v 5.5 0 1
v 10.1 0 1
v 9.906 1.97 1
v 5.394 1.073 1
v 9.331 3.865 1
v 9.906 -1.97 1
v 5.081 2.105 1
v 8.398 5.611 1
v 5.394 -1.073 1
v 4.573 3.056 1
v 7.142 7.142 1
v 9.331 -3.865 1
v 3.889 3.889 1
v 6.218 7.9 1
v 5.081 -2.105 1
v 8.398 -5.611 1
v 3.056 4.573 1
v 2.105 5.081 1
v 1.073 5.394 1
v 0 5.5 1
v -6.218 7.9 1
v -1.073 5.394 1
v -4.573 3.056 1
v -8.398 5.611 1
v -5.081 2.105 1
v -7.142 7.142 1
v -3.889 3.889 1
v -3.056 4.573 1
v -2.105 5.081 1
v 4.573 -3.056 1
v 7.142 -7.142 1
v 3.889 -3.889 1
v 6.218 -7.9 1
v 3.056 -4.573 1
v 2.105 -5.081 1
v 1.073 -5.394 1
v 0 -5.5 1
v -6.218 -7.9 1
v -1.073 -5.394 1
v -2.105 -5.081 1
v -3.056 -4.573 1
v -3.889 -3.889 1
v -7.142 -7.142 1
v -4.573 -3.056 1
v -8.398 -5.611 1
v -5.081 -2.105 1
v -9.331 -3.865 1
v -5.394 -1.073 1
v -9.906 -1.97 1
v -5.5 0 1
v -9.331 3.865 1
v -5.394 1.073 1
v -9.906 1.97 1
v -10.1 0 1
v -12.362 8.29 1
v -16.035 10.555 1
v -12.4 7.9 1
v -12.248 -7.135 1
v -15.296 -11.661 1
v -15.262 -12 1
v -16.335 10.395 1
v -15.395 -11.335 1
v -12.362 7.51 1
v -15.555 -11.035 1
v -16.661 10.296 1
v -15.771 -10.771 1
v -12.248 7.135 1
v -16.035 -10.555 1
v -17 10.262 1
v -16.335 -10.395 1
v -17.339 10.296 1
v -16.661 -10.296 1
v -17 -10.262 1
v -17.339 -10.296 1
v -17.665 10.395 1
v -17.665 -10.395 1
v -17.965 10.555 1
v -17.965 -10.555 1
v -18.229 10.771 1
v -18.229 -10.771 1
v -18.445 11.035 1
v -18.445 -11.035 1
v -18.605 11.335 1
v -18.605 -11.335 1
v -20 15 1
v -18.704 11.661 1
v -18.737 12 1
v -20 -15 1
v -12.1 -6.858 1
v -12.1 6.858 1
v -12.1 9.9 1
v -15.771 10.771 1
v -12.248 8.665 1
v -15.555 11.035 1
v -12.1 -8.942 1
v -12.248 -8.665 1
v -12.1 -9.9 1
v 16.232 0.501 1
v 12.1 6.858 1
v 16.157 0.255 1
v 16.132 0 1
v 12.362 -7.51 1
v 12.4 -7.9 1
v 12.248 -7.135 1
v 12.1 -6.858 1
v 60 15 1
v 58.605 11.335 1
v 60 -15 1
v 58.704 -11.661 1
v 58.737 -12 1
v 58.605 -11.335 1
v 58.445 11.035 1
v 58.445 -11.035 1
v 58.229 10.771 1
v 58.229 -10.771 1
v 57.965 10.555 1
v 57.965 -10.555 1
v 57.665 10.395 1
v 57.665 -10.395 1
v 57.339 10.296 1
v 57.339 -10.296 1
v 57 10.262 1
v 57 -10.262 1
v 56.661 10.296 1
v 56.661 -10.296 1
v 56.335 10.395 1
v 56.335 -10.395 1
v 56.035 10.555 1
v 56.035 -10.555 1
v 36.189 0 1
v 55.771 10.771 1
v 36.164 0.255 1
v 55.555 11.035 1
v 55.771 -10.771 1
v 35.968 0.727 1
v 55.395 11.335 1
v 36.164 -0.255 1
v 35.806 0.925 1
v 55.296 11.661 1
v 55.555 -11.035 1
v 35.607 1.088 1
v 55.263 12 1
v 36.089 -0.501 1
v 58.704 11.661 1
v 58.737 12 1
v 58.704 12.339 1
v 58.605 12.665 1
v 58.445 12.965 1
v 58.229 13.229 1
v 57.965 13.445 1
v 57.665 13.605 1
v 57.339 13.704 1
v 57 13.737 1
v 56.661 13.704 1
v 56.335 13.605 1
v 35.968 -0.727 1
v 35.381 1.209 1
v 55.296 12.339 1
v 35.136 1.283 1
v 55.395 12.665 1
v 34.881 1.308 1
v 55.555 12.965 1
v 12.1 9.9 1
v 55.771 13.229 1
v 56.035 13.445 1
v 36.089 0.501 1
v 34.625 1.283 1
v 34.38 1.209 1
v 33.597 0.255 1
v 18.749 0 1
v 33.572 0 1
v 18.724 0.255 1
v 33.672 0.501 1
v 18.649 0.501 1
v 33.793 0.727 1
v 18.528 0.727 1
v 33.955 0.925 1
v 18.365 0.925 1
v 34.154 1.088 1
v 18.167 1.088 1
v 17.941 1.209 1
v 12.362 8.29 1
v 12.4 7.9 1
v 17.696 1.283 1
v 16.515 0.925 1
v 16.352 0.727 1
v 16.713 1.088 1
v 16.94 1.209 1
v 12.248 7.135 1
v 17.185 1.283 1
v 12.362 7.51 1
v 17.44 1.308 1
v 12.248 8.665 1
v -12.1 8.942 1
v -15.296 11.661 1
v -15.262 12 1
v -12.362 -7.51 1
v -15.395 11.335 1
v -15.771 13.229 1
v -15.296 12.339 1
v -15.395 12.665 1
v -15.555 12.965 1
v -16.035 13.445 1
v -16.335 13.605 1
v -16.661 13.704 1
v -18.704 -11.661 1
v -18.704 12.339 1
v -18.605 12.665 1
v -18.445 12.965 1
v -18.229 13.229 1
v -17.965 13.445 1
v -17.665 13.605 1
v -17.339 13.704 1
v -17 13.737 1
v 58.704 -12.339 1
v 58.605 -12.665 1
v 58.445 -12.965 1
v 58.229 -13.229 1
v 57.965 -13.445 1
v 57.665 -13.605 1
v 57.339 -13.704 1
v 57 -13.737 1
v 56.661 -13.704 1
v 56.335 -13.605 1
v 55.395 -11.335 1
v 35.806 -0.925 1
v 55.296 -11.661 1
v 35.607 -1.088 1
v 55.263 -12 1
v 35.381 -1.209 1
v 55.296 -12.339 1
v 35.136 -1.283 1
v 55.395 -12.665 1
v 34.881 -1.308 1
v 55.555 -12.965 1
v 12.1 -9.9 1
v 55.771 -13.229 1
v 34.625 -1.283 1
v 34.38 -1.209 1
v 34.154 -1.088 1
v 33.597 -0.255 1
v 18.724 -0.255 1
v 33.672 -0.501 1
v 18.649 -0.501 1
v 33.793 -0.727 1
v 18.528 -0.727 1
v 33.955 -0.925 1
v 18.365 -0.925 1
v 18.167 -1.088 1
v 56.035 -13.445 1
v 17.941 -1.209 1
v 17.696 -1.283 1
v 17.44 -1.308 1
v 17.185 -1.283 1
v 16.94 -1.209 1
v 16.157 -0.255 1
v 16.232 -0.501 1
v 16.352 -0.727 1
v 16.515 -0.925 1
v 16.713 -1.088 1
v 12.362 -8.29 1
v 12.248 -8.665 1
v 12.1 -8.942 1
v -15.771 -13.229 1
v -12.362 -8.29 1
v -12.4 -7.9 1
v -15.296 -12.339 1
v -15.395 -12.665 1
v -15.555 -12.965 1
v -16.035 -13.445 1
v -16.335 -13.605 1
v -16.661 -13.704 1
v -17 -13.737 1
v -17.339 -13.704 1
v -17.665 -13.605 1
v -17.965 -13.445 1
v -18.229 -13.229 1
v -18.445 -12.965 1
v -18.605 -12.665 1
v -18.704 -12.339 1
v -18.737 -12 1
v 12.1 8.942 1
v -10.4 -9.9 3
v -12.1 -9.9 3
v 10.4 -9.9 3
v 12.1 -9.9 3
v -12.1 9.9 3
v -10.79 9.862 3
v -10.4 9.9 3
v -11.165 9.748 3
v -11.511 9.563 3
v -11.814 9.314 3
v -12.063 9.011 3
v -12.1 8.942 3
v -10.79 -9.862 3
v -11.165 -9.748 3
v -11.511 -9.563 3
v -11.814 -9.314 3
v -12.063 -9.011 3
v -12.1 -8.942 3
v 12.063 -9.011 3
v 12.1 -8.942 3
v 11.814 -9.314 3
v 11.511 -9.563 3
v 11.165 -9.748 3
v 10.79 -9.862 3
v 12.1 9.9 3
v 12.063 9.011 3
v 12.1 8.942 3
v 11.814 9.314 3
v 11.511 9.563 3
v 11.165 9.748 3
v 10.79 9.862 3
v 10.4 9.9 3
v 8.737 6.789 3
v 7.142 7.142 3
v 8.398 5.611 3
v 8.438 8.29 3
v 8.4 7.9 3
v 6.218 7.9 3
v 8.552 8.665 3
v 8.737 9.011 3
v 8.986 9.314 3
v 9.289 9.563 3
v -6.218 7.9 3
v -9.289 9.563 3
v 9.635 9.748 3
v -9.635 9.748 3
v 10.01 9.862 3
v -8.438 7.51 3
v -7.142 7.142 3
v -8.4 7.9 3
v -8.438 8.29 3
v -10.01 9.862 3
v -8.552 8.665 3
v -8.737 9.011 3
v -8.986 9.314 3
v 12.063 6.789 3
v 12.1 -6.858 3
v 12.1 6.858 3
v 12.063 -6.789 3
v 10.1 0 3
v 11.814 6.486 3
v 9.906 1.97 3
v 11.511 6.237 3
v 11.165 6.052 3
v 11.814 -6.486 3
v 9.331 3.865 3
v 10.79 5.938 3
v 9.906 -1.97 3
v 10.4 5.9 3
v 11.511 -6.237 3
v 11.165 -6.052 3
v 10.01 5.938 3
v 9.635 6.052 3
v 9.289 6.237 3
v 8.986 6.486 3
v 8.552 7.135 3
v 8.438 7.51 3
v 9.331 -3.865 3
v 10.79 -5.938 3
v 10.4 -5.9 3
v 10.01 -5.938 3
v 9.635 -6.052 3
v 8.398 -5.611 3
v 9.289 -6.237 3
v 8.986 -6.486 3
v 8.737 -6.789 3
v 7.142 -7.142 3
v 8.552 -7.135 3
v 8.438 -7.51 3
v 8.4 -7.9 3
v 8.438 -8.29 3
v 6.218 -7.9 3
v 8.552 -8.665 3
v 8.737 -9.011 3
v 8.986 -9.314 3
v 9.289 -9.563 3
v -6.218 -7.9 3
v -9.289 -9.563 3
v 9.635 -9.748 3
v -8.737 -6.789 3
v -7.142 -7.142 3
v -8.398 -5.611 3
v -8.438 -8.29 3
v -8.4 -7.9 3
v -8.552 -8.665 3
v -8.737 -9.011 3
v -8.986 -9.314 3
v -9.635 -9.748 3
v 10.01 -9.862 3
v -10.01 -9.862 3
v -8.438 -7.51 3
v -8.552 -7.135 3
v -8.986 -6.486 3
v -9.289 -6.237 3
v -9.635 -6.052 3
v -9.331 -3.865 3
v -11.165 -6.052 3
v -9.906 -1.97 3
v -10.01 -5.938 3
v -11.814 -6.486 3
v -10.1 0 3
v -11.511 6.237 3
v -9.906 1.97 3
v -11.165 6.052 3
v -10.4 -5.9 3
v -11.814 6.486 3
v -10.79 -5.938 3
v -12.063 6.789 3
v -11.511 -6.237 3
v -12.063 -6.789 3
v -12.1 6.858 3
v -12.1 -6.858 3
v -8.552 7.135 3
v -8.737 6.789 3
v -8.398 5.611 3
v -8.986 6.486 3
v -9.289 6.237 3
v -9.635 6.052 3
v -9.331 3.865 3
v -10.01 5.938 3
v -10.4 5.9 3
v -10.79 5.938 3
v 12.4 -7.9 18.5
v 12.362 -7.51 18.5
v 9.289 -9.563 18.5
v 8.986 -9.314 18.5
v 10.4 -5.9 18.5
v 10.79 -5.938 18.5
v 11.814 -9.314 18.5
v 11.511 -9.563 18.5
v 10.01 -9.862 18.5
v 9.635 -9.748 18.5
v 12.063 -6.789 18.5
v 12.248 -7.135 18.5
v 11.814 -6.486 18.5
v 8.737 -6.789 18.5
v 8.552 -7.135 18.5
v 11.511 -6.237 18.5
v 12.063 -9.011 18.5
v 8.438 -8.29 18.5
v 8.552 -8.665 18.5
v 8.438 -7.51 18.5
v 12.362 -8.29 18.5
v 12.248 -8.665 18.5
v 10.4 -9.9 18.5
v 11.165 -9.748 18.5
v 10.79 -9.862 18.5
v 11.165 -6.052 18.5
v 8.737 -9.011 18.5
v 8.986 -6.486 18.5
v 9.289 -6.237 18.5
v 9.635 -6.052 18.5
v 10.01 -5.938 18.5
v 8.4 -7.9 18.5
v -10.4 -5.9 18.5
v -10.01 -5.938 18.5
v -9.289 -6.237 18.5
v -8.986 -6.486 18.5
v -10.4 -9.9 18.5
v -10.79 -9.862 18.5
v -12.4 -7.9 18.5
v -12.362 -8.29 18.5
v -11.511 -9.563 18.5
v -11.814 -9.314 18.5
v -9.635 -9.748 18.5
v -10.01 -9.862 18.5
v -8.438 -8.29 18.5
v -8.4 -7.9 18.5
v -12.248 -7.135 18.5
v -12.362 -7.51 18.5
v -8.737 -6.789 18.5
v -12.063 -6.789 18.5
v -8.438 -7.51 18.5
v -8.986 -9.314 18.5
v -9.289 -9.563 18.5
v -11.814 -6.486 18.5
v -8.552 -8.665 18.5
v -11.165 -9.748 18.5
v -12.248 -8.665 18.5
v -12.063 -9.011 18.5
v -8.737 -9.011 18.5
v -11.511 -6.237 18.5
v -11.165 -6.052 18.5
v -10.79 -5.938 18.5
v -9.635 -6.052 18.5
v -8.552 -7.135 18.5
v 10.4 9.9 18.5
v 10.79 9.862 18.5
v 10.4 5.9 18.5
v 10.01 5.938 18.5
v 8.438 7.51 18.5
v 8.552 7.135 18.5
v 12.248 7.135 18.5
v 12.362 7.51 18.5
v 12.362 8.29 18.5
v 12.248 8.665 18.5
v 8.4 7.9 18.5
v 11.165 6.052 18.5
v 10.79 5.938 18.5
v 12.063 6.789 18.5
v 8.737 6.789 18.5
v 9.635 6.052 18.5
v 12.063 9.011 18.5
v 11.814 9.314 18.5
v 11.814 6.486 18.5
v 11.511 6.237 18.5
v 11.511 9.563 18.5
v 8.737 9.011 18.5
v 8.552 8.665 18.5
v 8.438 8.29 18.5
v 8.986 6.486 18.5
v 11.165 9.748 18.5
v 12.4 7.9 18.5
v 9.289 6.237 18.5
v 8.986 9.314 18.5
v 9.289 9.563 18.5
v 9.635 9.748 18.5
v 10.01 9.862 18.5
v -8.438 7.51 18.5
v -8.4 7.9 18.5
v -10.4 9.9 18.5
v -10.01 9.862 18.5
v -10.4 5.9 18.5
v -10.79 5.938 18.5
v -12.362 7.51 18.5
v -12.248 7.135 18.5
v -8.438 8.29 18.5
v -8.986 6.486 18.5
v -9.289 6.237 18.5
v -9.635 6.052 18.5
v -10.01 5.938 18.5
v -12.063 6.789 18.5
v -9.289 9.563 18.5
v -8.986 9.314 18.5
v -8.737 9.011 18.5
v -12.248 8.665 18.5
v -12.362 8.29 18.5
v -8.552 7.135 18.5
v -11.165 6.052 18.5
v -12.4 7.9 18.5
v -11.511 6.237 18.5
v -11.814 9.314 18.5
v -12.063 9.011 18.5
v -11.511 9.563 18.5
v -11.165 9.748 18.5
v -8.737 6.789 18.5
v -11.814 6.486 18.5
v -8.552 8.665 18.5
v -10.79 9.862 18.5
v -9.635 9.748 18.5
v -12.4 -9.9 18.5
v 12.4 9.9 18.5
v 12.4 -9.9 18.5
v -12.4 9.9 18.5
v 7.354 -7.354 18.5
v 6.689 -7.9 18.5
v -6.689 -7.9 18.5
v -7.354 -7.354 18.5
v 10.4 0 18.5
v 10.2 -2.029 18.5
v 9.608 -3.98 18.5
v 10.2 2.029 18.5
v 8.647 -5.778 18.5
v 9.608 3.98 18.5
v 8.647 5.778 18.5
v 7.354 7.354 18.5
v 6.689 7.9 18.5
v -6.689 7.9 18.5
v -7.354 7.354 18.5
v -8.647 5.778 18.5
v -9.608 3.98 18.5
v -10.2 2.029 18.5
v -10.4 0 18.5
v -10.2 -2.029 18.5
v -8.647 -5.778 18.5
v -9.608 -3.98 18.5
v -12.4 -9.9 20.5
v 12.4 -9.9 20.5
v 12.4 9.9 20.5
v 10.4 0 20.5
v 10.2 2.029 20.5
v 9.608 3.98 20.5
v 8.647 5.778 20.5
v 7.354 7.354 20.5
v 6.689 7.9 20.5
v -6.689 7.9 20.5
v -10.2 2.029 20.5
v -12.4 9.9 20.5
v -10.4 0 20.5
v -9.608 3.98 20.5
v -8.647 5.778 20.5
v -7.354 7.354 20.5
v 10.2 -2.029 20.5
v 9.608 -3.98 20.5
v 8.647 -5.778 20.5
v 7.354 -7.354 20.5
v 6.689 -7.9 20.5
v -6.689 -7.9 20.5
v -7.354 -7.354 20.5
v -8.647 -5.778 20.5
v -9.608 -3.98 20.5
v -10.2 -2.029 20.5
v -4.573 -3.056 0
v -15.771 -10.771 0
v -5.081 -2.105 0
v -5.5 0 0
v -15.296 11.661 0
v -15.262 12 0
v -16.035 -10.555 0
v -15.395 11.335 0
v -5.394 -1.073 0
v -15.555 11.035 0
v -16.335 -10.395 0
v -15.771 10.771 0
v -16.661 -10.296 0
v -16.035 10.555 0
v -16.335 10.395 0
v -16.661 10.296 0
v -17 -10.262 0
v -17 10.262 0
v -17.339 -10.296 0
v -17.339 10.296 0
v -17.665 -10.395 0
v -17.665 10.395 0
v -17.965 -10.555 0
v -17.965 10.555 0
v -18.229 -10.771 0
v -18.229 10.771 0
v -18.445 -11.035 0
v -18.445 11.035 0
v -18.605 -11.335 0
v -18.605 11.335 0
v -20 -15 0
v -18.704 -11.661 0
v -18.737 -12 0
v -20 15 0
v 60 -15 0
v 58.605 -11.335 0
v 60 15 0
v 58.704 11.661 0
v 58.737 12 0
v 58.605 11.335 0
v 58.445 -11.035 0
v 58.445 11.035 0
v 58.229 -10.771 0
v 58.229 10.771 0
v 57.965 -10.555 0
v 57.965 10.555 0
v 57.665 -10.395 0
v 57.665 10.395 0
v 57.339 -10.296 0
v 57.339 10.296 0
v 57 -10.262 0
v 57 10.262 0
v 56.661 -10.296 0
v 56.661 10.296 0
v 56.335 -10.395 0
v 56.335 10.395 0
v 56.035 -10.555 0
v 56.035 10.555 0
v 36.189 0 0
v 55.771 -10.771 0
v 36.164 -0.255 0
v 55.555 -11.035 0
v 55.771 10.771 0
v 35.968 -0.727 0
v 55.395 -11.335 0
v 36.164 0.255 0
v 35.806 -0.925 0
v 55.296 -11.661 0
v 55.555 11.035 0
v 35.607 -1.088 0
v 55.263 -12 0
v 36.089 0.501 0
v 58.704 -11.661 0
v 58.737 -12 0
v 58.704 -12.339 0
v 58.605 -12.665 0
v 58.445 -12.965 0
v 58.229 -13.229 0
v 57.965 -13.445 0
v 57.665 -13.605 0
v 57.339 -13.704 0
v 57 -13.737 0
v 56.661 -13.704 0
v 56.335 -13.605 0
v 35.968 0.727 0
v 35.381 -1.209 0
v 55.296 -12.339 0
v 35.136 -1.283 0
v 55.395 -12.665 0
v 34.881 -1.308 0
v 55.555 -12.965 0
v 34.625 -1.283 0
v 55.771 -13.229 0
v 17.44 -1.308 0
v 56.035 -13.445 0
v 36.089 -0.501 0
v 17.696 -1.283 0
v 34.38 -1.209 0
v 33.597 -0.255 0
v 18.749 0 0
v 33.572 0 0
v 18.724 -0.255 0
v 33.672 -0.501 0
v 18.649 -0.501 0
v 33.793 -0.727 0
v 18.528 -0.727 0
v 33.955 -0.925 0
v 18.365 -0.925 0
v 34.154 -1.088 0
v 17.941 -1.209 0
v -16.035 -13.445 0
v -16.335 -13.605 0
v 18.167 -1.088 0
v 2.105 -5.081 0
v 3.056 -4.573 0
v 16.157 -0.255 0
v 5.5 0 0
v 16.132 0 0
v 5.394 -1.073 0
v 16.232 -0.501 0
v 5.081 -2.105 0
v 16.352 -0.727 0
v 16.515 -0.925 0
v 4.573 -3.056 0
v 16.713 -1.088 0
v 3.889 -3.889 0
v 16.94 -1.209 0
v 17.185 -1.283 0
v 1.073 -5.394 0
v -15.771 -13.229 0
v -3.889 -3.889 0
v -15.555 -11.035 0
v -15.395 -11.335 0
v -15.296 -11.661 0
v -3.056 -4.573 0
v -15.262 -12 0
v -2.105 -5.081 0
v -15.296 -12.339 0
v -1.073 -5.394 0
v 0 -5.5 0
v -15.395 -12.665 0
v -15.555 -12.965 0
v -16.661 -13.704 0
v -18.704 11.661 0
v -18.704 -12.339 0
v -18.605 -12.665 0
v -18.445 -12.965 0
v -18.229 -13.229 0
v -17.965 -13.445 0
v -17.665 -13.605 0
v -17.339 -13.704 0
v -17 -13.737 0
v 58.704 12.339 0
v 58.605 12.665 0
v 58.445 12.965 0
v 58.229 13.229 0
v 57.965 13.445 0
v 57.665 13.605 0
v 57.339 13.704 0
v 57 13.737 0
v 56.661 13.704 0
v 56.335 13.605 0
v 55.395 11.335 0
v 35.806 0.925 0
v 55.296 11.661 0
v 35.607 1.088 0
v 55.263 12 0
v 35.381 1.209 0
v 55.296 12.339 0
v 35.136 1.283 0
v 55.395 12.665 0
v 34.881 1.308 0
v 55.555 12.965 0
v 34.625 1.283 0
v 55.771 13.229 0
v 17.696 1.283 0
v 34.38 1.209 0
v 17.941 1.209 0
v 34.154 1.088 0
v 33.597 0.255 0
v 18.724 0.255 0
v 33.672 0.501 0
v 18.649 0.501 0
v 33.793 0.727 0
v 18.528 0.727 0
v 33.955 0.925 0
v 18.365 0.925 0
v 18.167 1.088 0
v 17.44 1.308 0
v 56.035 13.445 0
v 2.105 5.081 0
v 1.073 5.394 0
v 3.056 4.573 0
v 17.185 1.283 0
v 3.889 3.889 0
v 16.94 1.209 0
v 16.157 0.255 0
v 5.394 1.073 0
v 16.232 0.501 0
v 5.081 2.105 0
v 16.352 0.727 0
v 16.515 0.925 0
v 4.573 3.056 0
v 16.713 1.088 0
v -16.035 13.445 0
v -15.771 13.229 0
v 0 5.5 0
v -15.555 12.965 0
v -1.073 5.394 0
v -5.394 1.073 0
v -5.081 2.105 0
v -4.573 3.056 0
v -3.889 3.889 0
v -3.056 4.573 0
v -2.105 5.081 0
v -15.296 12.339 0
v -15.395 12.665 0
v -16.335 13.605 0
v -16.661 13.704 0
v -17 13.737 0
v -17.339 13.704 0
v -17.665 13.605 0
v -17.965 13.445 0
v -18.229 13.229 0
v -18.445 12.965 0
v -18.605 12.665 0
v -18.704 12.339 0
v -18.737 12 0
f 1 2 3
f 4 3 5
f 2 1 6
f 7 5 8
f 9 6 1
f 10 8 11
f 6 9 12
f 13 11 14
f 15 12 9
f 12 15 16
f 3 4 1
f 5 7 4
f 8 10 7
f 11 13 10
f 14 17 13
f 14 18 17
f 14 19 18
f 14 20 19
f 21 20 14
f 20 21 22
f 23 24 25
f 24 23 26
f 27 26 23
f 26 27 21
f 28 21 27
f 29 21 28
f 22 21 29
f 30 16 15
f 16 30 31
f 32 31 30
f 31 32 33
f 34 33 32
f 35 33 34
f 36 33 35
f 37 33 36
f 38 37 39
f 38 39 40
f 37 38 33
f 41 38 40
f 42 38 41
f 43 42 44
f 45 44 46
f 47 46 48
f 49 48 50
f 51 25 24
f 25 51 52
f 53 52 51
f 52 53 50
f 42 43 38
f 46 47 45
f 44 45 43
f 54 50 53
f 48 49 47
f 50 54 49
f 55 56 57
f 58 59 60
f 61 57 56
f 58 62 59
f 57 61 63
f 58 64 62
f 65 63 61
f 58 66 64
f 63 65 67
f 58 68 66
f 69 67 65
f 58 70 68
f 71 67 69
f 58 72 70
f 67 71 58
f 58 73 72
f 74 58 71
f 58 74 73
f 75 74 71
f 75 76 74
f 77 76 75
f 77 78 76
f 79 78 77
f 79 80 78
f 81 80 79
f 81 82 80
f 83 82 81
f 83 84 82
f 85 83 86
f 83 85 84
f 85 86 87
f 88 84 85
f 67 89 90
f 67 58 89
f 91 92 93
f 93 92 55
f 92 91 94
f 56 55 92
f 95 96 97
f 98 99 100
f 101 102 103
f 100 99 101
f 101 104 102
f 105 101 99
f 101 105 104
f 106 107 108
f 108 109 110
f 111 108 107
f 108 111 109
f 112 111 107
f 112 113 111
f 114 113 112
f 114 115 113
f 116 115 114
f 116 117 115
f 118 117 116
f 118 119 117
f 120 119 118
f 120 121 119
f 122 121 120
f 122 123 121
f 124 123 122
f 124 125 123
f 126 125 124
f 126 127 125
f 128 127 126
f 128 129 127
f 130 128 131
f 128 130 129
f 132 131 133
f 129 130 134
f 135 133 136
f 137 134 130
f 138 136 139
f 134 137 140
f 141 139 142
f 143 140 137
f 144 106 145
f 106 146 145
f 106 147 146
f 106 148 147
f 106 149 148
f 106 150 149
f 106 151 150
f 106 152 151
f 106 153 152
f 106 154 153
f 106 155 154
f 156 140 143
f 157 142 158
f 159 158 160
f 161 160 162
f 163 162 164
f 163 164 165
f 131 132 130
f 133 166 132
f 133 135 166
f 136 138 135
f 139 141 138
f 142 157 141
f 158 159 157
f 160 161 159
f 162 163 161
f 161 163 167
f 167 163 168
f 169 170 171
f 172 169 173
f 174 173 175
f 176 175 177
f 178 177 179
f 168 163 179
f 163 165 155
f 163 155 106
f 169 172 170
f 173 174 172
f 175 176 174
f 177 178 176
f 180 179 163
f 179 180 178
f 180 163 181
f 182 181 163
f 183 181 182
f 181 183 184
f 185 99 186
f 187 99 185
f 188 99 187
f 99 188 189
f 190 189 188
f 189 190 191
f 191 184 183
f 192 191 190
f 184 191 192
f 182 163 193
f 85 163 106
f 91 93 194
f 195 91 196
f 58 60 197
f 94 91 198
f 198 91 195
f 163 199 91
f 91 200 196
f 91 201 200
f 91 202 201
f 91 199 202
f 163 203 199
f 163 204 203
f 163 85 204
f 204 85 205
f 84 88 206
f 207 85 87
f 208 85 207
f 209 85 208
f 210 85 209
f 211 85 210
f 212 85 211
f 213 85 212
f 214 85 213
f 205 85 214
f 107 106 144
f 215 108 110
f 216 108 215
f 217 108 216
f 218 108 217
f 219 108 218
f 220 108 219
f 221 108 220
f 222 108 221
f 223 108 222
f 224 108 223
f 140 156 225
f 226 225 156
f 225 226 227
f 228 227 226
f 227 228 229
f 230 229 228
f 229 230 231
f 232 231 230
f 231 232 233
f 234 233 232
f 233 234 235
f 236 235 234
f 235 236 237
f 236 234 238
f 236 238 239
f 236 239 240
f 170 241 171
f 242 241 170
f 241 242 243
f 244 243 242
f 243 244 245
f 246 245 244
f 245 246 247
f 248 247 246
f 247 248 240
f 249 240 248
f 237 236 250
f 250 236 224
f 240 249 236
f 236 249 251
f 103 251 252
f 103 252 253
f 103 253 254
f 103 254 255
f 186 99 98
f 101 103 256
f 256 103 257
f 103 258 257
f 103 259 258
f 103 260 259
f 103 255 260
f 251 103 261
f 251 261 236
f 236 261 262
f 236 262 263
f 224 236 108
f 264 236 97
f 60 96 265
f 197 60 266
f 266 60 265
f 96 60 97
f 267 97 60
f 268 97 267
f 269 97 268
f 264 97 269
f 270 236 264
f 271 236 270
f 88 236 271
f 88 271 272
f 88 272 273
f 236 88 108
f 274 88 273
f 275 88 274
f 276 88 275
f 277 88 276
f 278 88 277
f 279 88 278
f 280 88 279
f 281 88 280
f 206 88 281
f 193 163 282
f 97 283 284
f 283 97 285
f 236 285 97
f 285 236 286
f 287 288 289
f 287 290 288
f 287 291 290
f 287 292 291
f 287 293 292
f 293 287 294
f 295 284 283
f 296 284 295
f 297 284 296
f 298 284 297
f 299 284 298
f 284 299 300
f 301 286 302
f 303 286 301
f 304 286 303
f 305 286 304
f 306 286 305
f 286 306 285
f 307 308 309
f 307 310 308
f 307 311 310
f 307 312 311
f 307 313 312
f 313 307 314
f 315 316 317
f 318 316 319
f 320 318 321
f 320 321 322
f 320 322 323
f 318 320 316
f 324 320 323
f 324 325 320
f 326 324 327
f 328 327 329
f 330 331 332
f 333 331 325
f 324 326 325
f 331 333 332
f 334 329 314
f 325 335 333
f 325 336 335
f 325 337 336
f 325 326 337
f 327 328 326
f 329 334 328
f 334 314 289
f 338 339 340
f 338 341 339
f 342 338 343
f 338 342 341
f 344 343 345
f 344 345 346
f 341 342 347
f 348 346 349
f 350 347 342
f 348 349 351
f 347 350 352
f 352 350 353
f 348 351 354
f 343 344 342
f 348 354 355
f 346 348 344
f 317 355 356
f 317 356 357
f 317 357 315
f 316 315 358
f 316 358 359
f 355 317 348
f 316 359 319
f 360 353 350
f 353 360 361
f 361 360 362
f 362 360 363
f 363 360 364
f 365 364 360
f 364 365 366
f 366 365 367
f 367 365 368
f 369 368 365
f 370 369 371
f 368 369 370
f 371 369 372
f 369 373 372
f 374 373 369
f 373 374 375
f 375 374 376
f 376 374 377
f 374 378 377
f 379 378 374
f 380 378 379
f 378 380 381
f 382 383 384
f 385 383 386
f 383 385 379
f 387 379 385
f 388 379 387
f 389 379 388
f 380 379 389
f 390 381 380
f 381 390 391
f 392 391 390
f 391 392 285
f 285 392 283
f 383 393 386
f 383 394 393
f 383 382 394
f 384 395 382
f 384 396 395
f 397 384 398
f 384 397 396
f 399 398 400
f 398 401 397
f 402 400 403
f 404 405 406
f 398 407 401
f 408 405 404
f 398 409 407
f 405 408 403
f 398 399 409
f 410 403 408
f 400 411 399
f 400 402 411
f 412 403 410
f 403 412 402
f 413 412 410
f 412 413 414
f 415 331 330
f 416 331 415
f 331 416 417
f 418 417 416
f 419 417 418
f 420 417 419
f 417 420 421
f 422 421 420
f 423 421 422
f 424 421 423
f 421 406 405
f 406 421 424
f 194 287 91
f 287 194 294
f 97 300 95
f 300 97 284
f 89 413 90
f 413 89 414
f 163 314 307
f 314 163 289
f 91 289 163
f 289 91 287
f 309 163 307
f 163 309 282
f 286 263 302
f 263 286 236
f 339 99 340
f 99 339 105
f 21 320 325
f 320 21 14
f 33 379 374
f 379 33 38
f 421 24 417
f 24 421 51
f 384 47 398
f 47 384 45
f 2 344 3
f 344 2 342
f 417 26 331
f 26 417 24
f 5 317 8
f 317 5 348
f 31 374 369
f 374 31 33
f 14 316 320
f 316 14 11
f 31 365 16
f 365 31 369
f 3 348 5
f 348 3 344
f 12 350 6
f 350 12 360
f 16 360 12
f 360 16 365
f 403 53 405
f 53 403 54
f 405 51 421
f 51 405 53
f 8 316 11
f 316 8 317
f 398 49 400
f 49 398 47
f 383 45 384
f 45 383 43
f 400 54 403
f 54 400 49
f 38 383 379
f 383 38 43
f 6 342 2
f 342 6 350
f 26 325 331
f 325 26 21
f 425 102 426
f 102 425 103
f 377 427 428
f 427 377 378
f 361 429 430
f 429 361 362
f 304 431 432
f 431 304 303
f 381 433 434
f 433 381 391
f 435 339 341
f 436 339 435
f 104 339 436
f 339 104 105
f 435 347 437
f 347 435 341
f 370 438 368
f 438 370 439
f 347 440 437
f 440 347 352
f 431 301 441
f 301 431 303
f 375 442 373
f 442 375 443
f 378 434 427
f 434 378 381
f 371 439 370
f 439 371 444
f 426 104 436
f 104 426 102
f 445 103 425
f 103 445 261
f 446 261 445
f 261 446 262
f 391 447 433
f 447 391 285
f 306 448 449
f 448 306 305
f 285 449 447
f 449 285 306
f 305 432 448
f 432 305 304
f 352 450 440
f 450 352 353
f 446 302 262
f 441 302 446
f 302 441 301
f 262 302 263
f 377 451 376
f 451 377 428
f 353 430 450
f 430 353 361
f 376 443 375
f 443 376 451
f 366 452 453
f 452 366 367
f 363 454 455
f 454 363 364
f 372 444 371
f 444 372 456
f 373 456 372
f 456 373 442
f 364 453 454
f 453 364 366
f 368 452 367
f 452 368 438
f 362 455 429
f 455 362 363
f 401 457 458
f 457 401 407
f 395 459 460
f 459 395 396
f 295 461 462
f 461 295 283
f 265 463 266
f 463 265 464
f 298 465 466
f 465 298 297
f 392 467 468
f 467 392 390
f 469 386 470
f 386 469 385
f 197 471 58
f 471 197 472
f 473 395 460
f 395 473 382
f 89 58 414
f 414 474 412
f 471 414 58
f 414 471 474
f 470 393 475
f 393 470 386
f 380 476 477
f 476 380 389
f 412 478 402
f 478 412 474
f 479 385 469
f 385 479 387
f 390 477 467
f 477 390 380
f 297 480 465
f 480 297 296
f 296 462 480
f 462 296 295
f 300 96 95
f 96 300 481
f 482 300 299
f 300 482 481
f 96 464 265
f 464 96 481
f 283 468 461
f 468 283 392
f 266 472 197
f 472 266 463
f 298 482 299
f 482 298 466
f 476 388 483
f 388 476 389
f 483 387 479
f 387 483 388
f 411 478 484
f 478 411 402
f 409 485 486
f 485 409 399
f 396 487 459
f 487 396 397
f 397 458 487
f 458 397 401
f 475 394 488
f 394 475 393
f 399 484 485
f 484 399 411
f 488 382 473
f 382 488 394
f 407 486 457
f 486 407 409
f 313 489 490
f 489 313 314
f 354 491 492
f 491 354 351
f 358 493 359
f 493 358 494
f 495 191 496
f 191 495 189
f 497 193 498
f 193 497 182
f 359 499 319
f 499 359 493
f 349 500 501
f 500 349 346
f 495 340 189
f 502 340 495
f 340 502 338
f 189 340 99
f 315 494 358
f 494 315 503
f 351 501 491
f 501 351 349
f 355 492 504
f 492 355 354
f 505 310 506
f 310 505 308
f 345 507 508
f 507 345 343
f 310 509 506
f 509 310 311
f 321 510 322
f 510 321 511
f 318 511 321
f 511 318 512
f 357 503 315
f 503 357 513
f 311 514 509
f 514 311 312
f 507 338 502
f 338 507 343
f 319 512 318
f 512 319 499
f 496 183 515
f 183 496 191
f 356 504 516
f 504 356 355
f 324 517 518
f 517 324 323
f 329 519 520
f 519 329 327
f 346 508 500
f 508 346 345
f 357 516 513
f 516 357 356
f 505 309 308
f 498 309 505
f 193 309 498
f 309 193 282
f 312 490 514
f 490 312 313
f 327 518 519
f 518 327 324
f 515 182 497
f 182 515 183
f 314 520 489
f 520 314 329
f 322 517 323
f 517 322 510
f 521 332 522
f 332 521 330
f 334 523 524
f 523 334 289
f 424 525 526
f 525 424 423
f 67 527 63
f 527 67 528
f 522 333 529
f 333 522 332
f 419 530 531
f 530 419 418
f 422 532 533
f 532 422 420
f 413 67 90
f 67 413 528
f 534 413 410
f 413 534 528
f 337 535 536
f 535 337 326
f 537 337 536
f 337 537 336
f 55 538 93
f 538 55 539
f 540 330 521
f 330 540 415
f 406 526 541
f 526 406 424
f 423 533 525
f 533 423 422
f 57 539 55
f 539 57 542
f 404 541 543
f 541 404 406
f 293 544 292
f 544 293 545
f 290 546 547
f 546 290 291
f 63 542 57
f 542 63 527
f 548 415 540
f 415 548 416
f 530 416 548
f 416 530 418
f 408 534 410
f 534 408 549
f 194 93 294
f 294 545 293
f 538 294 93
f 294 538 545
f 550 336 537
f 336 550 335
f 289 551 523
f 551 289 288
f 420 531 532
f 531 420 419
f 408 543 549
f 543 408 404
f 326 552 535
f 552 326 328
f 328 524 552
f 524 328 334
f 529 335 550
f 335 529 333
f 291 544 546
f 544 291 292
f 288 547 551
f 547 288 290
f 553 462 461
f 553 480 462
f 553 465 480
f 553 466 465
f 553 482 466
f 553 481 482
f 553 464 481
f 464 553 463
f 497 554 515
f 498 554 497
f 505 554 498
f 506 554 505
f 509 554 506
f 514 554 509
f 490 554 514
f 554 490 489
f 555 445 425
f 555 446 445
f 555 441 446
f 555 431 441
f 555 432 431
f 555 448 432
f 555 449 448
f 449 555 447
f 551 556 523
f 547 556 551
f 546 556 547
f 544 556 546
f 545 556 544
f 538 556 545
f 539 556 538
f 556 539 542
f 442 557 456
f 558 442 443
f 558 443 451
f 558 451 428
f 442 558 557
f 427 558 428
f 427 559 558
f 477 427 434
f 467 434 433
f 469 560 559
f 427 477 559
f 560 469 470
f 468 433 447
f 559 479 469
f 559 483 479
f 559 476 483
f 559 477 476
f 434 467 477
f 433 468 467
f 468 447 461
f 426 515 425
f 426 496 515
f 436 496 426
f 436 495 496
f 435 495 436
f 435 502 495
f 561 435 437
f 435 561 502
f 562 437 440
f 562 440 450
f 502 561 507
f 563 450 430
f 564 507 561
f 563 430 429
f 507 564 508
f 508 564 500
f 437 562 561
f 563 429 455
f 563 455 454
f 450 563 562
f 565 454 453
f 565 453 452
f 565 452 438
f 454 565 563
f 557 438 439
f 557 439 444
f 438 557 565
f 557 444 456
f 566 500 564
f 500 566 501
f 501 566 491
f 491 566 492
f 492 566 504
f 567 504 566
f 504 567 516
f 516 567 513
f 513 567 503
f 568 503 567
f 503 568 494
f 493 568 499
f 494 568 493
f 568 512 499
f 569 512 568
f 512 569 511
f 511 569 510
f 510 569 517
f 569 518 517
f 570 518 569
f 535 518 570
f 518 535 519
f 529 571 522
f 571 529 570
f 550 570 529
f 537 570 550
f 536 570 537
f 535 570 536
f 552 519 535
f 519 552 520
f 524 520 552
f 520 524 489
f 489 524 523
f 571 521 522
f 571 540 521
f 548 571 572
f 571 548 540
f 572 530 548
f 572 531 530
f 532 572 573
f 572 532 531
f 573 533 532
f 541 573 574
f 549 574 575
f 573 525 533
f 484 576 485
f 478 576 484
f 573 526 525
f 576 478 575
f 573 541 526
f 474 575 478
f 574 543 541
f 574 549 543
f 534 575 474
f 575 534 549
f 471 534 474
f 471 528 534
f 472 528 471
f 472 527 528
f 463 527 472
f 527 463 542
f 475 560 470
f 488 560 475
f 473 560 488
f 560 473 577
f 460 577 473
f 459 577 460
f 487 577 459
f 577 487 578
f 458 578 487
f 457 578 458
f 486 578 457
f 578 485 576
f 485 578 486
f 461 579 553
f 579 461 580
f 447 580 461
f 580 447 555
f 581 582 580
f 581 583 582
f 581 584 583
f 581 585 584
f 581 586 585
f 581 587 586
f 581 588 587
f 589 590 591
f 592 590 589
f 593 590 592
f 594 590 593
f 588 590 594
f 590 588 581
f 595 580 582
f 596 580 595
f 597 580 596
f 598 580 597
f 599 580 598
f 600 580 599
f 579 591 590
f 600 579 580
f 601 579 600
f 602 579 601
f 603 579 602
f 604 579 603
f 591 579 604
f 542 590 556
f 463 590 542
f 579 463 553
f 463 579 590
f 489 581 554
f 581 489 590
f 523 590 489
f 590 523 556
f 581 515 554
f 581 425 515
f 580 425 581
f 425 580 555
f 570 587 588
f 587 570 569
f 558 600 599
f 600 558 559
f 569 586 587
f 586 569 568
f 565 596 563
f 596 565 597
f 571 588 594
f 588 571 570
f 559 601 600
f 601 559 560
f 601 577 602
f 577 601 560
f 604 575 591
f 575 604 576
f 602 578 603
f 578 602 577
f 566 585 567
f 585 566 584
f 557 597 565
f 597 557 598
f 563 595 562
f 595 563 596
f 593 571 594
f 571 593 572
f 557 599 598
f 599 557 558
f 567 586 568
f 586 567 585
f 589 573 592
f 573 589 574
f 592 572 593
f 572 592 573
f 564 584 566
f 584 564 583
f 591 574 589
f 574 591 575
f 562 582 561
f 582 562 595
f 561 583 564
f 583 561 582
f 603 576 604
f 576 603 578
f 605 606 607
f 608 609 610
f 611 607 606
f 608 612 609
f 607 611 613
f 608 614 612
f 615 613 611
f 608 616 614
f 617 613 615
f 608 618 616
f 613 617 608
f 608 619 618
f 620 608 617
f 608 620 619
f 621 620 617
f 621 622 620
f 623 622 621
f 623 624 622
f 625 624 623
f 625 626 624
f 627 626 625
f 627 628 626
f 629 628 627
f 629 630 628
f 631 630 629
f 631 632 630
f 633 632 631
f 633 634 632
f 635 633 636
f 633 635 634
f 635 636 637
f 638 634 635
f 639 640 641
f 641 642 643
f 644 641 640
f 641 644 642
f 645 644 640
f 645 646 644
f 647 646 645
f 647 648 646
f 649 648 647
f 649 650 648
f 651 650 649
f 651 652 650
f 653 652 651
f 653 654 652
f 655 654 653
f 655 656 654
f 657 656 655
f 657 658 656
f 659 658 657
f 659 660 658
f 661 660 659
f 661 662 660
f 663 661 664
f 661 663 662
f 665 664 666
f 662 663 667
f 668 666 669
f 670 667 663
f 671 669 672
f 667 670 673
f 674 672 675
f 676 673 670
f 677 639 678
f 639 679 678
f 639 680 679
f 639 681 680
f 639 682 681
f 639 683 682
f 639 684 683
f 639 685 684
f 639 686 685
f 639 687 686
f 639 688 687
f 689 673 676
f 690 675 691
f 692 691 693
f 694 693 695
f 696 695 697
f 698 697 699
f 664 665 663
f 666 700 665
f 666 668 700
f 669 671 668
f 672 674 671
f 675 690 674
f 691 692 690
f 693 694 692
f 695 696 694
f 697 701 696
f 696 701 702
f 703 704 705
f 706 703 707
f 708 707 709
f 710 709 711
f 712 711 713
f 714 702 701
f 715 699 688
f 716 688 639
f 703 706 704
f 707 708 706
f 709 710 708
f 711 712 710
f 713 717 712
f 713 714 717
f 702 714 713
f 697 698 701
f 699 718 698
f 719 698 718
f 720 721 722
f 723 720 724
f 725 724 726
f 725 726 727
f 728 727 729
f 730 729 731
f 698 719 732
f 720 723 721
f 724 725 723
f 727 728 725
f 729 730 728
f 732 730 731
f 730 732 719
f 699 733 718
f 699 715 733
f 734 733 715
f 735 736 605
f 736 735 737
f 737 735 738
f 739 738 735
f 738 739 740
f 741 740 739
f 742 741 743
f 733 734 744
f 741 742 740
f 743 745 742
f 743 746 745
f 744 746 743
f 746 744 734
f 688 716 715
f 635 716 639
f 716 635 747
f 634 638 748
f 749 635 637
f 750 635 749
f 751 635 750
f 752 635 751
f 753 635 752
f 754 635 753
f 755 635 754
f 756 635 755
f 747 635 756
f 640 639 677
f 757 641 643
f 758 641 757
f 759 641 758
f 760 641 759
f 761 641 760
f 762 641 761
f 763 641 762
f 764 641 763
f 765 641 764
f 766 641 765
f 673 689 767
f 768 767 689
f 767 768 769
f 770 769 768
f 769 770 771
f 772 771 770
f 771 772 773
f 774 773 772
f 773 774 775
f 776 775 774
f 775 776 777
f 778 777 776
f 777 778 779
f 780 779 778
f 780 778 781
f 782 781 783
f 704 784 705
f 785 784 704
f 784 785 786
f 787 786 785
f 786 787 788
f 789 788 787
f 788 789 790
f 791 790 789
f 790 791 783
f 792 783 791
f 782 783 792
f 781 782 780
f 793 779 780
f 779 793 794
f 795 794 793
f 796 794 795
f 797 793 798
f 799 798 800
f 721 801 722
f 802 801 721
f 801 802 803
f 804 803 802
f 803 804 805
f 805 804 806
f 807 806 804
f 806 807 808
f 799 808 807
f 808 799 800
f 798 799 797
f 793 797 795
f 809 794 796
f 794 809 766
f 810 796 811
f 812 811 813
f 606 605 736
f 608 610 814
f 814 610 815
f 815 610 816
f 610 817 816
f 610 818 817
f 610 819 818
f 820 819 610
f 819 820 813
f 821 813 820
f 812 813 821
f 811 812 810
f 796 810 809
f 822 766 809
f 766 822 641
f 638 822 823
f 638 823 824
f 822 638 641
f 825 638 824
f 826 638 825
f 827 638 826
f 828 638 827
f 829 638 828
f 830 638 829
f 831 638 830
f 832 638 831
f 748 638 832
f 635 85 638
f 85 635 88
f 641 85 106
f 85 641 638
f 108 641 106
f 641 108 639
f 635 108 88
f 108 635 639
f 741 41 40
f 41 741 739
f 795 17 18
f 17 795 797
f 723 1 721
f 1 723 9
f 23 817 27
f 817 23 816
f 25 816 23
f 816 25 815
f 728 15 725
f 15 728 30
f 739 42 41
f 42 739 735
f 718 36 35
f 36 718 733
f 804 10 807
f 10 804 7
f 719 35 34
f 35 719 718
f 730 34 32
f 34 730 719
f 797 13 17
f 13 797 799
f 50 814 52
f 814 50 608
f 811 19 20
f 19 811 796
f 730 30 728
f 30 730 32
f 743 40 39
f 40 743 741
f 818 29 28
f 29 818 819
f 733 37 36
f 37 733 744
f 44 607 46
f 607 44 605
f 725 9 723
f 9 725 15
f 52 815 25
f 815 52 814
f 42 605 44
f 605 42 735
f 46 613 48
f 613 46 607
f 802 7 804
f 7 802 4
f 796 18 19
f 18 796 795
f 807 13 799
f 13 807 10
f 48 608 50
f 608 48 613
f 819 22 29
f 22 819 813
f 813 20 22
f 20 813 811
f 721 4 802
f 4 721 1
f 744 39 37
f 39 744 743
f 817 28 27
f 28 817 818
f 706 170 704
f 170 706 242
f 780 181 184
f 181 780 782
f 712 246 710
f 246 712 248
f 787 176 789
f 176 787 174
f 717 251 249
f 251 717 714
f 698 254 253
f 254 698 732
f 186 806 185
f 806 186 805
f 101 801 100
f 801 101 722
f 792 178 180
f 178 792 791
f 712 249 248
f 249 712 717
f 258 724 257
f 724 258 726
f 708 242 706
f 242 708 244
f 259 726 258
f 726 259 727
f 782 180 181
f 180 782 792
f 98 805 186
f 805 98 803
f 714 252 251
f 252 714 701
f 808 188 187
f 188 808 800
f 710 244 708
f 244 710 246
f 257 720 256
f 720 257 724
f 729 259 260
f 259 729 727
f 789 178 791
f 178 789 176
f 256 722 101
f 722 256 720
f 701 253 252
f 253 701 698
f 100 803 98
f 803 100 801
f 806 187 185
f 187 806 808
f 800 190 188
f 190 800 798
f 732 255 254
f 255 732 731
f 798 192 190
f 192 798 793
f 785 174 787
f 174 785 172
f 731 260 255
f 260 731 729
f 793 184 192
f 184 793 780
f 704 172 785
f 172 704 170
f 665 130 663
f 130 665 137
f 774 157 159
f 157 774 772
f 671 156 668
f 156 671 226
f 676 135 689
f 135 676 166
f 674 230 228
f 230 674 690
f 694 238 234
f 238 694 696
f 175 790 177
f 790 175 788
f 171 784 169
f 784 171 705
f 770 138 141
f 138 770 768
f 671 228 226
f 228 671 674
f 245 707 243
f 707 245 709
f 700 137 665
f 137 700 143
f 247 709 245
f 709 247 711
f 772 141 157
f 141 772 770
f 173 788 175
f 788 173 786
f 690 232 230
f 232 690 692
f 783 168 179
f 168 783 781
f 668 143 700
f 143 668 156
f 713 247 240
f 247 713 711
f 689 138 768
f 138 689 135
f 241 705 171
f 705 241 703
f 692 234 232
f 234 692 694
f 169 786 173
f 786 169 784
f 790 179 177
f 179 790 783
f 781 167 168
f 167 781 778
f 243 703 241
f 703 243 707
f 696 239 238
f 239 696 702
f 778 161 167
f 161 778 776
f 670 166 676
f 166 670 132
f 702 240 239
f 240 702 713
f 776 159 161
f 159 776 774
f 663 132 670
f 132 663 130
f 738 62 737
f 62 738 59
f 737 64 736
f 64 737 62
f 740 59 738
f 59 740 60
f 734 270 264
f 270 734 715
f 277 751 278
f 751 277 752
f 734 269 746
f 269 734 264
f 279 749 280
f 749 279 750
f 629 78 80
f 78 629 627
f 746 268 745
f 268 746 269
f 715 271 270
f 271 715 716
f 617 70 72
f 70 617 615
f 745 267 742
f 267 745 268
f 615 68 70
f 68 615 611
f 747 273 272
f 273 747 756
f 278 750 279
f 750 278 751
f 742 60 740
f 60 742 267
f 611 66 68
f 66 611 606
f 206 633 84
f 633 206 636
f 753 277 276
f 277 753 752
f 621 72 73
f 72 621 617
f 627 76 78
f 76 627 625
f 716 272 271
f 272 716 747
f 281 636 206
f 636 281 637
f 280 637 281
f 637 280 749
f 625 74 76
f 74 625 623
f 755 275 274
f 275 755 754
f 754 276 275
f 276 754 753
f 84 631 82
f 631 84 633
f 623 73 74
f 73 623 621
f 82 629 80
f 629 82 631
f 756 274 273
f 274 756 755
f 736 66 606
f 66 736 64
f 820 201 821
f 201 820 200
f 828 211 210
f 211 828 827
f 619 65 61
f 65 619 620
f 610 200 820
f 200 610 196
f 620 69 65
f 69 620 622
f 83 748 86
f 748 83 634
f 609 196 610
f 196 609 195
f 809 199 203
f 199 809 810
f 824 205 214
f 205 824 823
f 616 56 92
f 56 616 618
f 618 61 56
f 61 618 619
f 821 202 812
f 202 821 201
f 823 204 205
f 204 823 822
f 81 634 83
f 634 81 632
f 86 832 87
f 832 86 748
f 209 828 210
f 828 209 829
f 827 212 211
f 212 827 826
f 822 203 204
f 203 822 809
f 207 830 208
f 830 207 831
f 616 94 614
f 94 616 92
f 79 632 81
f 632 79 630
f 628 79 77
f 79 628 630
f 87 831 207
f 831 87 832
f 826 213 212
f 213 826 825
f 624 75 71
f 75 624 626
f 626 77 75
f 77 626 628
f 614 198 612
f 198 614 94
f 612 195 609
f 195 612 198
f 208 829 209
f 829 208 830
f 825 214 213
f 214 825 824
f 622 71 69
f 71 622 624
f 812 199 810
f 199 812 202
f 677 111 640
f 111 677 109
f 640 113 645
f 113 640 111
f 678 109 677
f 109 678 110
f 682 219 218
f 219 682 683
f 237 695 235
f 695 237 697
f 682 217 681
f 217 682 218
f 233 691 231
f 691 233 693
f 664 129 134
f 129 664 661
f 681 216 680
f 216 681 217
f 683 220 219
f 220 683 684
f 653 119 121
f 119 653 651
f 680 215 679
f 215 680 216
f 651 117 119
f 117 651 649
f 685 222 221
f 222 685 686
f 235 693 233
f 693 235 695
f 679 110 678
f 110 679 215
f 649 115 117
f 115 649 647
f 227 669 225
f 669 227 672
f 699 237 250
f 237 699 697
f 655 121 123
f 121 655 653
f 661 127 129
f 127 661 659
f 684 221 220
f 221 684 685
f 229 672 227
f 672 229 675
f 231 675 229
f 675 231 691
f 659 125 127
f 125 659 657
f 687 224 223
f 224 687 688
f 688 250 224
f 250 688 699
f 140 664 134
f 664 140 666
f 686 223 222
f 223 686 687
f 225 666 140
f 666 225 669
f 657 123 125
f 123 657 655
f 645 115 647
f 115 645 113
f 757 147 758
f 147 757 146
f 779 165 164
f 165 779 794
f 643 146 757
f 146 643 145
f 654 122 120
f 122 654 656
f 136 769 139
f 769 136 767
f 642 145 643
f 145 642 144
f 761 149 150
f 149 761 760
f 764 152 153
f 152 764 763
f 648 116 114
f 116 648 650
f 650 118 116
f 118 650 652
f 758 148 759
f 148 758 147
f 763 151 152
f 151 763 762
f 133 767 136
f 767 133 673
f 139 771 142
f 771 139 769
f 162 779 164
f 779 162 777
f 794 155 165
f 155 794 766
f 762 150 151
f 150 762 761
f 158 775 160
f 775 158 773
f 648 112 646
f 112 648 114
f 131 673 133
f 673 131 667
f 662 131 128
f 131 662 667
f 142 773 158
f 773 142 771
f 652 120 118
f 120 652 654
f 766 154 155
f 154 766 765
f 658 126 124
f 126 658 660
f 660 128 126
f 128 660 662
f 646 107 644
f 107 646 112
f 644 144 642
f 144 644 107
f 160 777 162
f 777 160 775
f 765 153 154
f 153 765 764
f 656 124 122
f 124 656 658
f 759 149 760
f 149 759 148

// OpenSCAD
// motor holder
//
// motor has radius of '$mr' with flattened sides at '$mh' and length of '$ml'

// NOTE:  some tolerance added 
$mr = 10.4; // 10 mm radius + shrinkage (was 10.7)
$mh = 15.8; // 15 mm height + shrinkage
$ml = 25.0; // 25.0 mm length excluding 'nubs'
$ml2 = 19.5; // 19.5 mm lengh excluding end cap and shaft guide hole 'nub'

$th = 4.0; // overall thickness of plastic around motor
// NOTE:  wall thickness on sides is 1/2 this

// shaft guide hole size
$sh = 3.1;  // 3.1mm radius
$sw = 2;  // 2mm approximate height of guide
$ft = 1;  // 1mm approximate thickness of face
$pr = 2;  // 2mm appx radius of post

$sd1 = 0.97 * 2.54 * 1.02 / 2; // shaft radius
$sd2 = 1.01 * 2.54 * 1.02 / 2; // loose shaft radius

// motor shaft extension length
$sl = 10.0; // length of shaft from flat end of motor
$gh = 5.5;  // radius of gear hole



// global accuracy parameters
$fn=32; // number of faces in shape

module face(hh,bb=0)
{
  mrr = $mr + bb;  
    
  union()
  {
    difference()
    {
      linear_extrude(height=hh)
        square([$mh + $th, mrr * 2 + $th], true);

      translate([0,0,-1])
        linear_extrude(height=hh+2)
          polygon(points=[[-$mh/2,-mrr],[$mh/2,-mrr],[$mh/2,mrr],[-$mh/2,mrr]]);
    }

    difference()
    {
      linear_extrude(height=hh)
        polygon(points=[[-$mh/2,-mrr],[$mh/2,-mrr],[$mh/2,mrr],[-$mh/2,mrr]]);

      translate([0,0,-1])
        linear_extrude(height=hh+2)
          circle(mrr);
    }
  }
}

module motor_holder()
{
  translate([0,0,$ft])
    union()
    {
      color("green")  
        face($sw,-0.3);

      color("yellow")
        union()
        {
          translate([-$mh/2,-$mr,0])
            linear_extrude(height=$ml2-$sw+1)
              circle($pr);

          translate([-$mh/2,$mr,0])
            linear_extrude(height=$ml2-$sw+1)
              circle($pr);

          translate([$mh/2,-$mr,0])
            linear_extrude(height=$ml2-$sw+1)
              circle($pr);

          translate([$mh/2,$mr,0])
            linear_extrude(height=$ml2-$sw+1)
              circle($pr);
        }

      color("blue")
        translate([0, 0, $ml2-$sw])
          face($sw,0);
    }

//  color("purple")
//    difference()
//    {
//      linear_extrude(height=$ft)
//        square([$mh + $th, $mr * 2 + $th], true);
  
//      translate([0,0,-1])
//        linear_extrude(height=$ft+2)
//          circle($gh);
//    }
}

//  echo("****************");
//  echo("face is ",$mh+$th," by ", $mr * 2 + $th," (mm)");

//  echo("overall height is ", $ft + $ml2, " (mm)");
//  echo("****************");

$xd = 25.4 / 8 + 0.3; // screw holes

rotate(a=[0,0,90])
  motor_holder();

color("orange")
  difference()
  {
    translate([20,0,0])
      linear_extrude(height=$ft)
        square([80,30],true);

    translate([0,0,-1])
      linear_extrude(height=$ft+2)
        circle($gh);

  // from gear_test2
  // gear wheel radius: 0.125 in 3.175 mm
  // Tooth side length: 0.0669041 in 1.69937 mm
  // gear radius: 0.185786 in 4.71897 mm

  // from gear-test4
  // gear wheel radius: 0.4923, in 12.5044 mm
  // Tooth side length: 0.0669012 in 1.69929 mm
  // gear radius: 0.557684 in 14.1652 mm

    translate([3.175+14.1653+0.1, 0,-1])
      linear_extrude(height=$ft+2)
        circle($sd2);
    
    translate([2*(3.175+14.1653+0.1), 0,-1])
      linear_extrude(height=$ft+2)
        circle($sd2);

    translate([-17,-12,-1])
      linear_extrude(height=$ft+2)
        circle(d=$xd);
    translate([-17,12,-1])
      linear_extrude(height=$ft+2)
        circle(d=$xd);
    translate([57,-12,-1])
      linear_extrude(height=$ft+2)
        circle(d=$xd);
    translate([57,12,-1])
      linear_extrude(height=$ft+2)
        circle(d=$xd);
  }
